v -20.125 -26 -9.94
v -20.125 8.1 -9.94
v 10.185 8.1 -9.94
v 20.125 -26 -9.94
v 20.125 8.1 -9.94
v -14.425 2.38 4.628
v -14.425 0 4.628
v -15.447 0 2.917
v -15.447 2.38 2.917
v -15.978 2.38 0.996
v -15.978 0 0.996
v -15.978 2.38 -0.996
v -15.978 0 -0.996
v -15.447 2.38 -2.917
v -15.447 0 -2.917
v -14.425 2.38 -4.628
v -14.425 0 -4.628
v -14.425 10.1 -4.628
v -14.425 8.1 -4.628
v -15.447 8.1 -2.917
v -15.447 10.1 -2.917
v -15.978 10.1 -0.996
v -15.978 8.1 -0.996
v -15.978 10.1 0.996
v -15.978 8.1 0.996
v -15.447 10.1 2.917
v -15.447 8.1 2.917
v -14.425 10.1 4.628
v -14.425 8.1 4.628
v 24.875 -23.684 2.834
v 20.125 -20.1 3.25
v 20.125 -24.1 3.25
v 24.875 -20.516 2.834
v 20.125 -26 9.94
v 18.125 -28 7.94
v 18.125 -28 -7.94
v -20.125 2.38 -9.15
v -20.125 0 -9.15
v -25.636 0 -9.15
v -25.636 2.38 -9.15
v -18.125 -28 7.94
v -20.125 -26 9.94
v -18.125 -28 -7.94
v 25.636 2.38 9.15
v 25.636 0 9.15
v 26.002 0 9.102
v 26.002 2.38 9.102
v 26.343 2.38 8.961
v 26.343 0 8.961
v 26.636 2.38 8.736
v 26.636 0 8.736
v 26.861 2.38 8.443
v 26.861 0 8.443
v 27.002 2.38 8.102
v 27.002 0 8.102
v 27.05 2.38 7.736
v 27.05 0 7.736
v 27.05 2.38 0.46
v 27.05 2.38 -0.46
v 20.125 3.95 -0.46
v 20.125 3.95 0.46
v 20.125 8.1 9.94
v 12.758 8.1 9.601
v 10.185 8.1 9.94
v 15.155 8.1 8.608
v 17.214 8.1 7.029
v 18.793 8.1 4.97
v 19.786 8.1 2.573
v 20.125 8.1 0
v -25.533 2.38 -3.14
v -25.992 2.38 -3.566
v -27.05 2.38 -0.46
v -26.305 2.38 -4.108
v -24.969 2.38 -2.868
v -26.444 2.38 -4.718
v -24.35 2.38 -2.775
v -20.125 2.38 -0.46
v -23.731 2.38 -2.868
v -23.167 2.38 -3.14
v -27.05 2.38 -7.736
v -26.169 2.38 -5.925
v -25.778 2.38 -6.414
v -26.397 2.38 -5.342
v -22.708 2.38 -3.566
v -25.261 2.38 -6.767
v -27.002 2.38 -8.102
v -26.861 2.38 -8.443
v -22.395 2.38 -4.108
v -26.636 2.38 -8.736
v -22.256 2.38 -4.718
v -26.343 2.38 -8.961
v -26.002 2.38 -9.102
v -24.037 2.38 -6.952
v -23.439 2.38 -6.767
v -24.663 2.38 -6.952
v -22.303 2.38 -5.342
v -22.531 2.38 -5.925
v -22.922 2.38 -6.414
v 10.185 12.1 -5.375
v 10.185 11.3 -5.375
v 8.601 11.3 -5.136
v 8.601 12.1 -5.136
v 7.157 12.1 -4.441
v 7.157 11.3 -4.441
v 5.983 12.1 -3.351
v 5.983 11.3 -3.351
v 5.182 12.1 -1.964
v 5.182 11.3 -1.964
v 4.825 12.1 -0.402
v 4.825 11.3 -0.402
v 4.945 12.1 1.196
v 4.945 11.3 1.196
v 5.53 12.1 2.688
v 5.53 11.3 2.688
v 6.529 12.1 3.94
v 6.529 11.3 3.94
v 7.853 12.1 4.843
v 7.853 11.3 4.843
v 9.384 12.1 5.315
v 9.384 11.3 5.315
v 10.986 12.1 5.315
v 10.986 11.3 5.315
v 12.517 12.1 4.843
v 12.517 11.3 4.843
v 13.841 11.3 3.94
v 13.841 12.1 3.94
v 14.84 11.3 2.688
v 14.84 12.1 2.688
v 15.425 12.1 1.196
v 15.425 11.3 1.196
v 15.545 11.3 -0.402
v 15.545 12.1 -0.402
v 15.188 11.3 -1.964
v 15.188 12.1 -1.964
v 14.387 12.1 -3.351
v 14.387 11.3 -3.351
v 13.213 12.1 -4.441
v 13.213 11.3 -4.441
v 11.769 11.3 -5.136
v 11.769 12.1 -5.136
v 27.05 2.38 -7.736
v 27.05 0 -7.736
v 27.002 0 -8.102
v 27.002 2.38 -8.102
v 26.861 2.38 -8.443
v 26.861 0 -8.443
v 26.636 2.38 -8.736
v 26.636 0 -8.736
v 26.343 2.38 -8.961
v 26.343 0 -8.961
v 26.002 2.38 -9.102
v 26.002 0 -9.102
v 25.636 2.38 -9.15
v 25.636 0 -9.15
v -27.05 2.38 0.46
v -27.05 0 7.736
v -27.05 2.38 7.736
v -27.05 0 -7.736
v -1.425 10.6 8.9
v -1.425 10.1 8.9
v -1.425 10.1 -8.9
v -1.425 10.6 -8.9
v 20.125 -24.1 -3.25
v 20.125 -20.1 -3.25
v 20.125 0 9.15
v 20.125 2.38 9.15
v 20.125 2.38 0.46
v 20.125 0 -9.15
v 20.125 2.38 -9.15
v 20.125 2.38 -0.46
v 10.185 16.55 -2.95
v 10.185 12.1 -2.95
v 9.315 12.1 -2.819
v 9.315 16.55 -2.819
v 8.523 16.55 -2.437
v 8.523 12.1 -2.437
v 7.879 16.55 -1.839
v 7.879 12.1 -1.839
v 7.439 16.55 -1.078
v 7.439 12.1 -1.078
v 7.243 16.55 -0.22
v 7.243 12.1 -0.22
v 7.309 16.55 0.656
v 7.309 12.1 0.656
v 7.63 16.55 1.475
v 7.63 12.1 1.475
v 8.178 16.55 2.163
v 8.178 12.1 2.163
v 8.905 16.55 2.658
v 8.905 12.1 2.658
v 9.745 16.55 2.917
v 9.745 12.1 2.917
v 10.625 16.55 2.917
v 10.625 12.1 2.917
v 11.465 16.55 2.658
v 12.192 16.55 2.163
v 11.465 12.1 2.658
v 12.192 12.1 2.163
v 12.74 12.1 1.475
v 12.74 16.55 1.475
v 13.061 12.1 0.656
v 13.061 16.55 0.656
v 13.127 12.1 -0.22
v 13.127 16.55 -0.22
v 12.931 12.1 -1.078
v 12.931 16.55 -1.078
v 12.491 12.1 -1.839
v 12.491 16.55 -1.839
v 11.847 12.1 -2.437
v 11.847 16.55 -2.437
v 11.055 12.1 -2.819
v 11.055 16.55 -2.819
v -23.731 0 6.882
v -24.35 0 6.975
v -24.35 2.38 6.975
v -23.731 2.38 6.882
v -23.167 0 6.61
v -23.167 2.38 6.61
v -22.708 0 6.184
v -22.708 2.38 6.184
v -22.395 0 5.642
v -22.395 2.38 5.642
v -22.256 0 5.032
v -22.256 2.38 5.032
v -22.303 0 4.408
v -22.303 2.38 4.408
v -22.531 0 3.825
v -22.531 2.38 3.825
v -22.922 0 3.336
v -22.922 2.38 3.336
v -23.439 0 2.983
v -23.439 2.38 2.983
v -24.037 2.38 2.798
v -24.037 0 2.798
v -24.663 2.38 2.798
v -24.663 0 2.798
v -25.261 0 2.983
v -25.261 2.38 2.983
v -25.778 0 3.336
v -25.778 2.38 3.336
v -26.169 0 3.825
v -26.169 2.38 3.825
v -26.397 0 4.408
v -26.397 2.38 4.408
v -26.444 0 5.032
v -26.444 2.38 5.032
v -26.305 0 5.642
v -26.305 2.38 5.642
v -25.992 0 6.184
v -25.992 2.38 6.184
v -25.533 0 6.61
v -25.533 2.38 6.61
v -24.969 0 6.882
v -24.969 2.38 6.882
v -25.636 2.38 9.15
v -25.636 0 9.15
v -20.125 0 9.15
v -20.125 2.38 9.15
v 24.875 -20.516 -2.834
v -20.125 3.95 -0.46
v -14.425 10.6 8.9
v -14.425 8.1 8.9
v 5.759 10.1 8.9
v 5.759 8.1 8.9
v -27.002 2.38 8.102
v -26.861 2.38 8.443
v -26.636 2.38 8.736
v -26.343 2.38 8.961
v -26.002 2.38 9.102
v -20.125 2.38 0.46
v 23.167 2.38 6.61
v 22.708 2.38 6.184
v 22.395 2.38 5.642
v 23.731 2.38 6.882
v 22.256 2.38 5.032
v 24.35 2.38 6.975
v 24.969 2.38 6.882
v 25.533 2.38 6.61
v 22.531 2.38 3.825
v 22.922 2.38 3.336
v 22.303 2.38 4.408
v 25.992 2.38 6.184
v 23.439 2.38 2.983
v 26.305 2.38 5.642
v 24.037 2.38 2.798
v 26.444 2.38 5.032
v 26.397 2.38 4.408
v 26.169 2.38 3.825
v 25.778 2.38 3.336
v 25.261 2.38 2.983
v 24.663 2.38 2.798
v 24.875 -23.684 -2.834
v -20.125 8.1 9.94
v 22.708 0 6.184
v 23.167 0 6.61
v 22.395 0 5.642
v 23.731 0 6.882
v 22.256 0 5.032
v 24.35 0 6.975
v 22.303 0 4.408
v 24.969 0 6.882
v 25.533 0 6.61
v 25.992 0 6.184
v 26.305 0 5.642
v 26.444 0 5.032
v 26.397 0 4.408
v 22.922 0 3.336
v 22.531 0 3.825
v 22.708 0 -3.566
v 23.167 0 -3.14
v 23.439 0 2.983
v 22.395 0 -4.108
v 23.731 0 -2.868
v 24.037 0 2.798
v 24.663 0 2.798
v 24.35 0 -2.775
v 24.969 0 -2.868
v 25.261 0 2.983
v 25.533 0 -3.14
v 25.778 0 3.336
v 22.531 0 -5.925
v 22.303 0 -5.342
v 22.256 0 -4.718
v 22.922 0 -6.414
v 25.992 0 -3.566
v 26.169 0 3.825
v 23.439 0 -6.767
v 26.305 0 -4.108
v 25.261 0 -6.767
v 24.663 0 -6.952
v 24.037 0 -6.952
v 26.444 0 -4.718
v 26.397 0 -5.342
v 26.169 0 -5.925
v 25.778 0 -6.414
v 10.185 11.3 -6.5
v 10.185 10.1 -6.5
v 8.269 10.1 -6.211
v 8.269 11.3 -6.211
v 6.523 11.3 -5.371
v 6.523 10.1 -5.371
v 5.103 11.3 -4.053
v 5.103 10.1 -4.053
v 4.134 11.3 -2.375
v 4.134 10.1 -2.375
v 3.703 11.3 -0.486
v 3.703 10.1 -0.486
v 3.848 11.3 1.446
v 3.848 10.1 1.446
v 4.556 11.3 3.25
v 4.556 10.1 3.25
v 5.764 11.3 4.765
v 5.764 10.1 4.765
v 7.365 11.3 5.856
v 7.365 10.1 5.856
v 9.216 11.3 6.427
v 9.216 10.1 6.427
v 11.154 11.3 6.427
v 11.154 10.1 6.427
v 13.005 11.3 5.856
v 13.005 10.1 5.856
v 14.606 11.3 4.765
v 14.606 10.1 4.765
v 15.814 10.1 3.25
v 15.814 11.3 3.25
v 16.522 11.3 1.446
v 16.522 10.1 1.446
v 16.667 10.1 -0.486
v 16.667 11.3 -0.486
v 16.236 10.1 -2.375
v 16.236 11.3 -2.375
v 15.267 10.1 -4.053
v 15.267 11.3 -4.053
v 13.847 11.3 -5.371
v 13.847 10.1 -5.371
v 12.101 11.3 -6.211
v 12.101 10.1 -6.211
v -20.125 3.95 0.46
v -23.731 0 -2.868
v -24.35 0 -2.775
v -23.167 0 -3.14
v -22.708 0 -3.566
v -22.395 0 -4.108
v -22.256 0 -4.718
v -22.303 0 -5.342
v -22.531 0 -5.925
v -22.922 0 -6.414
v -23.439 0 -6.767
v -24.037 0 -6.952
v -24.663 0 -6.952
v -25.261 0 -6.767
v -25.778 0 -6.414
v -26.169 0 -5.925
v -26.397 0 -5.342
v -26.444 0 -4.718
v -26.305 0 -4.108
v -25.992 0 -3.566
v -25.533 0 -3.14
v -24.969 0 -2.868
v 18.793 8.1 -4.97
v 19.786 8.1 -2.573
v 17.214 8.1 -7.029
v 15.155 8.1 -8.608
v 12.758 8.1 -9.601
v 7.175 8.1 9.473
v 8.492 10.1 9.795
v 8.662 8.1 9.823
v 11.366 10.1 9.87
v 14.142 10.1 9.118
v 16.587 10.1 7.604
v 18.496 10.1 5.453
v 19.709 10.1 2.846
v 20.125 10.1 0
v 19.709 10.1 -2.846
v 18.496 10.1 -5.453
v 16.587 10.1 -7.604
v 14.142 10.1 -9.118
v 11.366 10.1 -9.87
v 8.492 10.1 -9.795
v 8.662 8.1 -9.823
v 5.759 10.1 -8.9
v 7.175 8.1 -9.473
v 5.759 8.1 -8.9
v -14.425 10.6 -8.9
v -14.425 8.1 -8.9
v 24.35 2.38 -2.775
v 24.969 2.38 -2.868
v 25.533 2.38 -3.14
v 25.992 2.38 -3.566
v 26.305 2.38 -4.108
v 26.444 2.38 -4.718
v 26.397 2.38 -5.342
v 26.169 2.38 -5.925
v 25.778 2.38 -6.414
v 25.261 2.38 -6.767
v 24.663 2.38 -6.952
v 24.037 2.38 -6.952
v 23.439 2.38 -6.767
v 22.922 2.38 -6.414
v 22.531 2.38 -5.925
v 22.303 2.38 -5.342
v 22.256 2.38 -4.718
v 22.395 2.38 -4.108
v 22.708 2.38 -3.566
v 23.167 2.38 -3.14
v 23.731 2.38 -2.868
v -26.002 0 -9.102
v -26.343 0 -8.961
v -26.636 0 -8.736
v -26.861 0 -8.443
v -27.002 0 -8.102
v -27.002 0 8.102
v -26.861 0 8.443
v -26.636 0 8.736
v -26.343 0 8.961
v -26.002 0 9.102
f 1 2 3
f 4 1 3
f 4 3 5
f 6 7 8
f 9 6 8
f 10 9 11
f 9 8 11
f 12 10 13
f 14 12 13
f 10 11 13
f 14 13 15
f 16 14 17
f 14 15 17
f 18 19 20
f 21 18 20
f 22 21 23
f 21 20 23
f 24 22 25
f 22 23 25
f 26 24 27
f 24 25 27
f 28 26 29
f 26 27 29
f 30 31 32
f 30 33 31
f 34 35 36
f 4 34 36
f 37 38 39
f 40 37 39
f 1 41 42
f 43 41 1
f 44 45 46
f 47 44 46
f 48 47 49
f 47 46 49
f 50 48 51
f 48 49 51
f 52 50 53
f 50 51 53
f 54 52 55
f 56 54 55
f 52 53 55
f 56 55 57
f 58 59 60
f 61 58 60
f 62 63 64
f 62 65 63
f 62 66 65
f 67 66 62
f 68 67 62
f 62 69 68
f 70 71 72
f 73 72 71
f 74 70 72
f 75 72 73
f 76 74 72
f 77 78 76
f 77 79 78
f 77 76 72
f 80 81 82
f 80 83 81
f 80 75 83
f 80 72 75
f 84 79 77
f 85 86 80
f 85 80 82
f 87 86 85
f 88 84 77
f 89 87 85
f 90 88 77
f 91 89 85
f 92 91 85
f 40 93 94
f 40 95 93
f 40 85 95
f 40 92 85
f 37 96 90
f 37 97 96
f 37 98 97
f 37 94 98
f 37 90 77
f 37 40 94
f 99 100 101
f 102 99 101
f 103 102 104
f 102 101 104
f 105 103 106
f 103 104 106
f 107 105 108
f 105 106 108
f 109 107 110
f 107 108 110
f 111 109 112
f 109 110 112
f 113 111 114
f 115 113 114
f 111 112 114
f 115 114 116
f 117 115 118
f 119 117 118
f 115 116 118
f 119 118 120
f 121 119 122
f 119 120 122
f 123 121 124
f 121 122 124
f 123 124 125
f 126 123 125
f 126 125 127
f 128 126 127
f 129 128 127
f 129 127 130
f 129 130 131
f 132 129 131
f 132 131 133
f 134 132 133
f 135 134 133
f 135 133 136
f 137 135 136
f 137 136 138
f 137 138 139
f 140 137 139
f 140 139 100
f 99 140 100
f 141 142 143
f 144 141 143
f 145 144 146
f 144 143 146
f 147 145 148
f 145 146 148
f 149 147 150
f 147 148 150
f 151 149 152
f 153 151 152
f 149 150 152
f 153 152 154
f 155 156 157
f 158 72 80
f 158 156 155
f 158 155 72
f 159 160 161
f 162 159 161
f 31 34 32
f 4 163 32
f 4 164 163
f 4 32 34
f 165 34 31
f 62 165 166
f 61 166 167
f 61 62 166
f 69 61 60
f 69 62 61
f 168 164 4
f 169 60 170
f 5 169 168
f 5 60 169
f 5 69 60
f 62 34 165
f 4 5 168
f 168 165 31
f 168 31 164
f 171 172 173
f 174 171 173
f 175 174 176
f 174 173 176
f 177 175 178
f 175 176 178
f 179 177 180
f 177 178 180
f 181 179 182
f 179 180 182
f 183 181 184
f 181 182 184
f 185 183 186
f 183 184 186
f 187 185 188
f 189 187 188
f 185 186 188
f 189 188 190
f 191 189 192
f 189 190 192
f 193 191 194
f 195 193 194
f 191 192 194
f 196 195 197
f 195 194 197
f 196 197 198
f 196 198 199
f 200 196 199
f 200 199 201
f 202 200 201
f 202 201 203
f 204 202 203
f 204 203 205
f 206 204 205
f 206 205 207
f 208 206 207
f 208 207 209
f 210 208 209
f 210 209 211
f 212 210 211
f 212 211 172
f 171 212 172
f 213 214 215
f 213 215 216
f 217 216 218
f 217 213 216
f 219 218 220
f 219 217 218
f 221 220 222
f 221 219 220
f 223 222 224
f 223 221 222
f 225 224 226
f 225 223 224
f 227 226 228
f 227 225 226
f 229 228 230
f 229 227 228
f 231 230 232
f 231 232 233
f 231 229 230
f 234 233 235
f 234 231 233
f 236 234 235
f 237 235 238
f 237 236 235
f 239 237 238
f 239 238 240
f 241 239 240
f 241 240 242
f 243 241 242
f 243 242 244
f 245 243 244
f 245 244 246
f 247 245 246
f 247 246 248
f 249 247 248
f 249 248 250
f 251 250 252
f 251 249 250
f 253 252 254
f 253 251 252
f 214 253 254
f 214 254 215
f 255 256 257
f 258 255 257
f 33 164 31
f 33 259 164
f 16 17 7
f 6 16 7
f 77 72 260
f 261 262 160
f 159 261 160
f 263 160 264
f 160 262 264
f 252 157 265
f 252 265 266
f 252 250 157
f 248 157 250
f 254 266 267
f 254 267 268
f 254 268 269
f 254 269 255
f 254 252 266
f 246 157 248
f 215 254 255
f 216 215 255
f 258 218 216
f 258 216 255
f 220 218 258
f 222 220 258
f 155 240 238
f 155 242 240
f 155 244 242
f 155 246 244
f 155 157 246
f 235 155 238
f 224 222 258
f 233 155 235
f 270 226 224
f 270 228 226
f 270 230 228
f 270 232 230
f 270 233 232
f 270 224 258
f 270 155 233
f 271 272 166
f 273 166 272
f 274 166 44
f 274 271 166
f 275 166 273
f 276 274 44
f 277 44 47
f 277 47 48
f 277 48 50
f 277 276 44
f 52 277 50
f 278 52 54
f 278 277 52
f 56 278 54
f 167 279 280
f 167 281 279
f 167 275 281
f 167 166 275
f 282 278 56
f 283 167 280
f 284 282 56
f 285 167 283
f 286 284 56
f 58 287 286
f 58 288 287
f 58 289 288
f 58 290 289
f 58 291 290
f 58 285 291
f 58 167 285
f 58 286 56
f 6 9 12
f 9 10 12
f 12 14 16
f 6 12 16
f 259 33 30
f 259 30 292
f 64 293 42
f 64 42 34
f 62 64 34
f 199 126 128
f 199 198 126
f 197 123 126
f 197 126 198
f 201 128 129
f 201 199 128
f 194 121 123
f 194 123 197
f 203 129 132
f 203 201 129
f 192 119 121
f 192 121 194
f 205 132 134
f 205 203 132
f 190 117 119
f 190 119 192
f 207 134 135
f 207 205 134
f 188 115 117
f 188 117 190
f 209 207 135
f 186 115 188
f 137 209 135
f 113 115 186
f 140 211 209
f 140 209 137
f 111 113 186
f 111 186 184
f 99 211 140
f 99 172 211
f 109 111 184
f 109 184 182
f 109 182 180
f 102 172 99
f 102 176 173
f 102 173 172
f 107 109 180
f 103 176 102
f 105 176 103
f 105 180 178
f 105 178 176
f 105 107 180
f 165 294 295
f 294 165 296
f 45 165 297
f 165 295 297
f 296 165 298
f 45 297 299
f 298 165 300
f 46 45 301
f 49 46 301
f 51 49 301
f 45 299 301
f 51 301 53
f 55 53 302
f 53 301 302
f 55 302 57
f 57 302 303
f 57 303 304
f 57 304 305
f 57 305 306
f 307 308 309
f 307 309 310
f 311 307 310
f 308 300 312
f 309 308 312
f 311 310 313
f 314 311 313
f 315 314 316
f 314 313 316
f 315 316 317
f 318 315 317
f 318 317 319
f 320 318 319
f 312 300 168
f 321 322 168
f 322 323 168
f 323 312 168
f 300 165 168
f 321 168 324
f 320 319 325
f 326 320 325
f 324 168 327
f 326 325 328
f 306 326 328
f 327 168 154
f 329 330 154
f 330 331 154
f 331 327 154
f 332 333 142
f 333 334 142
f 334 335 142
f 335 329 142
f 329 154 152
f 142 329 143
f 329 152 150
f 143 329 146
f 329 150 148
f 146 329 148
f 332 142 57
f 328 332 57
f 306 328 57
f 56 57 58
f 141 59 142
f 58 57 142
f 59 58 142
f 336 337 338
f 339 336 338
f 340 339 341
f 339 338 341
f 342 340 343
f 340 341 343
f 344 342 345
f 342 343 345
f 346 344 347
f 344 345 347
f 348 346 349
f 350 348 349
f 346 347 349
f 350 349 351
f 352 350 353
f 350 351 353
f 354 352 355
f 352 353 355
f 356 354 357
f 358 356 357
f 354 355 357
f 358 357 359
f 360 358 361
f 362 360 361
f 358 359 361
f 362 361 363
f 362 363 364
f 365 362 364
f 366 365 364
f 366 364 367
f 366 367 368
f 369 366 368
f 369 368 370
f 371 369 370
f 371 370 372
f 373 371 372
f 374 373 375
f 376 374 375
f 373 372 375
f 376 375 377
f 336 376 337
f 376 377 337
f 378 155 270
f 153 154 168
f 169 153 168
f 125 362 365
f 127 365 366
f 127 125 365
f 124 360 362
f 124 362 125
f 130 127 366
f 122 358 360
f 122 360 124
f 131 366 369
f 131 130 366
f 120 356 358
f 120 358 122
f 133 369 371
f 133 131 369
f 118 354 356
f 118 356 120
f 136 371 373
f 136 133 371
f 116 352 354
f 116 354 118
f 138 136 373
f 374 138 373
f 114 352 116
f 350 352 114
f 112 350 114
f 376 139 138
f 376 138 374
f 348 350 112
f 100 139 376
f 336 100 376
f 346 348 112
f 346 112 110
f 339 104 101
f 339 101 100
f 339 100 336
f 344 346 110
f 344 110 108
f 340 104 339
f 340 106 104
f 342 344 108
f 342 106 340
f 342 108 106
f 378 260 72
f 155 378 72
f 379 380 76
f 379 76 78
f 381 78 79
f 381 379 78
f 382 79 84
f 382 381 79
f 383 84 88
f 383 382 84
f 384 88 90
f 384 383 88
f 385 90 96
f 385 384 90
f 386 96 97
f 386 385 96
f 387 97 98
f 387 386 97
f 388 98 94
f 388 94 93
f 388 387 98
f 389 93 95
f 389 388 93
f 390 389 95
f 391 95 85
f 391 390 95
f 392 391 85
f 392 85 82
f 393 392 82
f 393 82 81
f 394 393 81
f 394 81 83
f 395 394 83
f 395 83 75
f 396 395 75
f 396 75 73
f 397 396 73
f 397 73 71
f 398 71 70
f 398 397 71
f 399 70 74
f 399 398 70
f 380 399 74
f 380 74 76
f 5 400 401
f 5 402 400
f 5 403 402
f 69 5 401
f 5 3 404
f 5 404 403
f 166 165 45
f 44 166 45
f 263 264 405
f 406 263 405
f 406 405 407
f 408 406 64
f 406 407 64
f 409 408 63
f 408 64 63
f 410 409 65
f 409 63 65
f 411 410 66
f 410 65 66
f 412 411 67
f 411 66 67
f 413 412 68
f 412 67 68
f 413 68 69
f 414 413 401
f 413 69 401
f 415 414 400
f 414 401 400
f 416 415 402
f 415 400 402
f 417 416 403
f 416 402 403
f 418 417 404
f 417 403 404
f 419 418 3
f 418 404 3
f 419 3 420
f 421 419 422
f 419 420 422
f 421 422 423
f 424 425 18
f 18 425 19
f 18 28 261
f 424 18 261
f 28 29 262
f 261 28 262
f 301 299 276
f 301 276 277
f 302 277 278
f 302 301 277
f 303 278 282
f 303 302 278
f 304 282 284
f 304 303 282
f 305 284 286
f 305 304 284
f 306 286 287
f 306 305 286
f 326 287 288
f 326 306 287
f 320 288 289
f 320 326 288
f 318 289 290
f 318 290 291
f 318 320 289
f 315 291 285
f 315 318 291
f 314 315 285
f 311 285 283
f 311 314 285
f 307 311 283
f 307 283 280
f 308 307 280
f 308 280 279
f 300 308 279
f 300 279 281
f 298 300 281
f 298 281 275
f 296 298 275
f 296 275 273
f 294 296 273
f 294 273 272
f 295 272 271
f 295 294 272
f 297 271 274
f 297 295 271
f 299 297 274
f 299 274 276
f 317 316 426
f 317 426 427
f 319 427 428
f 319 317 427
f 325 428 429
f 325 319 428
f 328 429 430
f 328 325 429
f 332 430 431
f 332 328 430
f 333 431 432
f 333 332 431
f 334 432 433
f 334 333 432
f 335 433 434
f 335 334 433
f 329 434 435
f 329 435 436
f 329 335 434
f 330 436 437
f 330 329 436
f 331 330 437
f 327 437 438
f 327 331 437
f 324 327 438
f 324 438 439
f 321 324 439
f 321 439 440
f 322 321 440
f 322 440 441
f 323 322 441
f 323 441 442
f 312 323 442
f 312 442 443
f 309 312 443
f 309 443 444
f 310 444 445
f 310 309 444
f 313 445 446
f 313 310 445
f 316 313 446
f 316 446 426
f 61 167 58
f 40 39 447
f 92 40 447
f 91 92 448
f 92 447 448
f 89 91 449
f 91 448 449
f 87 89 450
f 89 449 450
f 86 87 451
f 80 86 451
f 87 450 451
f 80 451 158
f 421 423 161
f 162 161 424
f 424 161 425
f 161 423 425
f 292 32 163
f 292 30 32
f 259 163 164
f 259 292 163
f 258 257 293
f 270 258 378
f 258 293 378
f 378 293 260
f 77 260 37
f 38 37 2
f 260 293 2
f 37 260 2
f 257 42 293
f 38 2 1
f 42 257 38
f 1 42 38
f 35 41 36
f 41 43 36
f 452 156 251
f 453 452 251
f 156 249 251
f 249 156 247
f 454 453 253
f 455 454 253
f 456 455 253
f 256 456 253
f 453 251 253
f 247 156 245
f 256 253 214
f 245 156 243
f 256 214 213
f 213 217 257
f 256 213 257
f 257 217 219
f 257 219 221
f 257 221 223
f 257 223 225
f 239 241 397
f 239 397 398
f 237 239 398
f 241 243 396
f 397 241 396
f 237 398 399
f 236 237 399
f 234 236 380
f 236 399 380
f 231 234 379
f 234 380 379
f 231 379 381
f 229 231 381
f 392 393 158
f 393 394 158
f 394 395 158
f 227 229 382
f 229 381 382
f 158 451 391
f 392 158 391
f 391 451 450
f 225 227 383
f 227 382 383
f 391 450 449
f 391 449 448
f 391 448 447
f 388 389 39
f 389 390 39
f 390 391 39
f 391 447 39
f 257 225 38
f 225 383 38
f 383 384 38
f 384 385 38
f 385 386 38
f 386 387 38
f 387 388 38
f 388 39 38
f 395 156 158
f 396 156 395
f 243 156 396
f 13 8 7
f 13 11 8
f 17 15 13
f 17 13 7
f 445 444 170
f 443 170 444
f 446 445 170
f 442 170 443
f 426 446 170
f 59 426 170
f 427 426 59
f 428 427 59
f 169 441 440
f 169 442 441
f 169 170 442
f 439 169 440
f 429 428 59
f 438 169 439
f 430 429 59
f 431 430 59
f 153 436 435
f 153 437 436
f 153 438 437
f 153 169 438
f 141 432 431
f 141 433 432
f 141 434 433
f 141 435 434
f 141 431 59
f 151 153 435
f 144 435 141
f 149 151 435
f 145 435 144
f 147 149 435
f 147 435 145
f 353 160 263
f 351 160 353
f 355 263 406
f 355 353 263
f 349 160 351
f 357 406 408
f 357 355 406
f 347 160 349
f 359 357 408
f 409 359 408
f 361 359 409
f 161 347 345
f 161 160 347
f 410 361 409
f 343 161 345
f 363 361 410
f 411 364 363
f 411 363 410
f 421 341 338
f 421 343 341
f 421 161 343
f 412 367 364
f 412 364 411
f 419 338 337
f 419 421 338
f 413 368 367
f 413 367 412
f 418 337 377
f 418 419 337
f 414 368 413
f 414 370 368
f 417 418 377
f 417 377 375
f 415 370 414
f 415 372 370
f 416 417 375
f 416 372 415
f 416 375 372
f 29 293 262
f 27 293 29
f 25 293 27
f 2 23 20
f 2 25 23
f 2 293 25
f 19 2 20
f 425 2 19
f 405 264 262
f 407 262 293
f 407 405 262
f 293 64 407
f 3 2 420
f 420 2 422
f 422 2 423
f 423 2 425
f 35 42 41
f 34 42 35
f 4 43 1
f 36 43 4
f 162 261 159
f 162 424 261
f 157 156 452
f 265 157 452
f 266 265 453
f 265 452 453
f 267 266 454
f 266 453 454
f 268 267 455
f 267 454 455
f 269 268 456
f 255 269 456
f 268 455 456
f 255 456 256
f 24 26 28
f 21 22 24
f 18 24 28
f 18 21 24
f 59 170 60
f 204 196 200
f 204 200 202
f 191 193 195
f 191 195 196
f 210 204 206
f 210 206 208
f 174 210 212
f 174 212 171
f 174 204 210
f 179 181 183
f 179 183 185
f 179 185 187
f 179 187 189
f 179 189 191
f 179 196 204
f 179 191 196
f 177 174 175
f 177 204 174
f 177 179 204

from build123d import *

# Parameters (mm, degrees)
SKETCH1_R           = 2.1
BOSS_EXTRUDE1_DEPTH = 2.38
BOSS_EXTRUDE2_START = 2.38
SKETCH1_3_W         = 40.25
SKETCH1_3_H         = 19.88
SKETCH1_3_W_2       = 6.925
SKETCH1_3_H_2       = 0.92
BOSS_EXTRUDE2_DEPTH = 5.72
BOSS_EXTRUDE3_START = 8.1
BOSS_EXTRUDE3_DEPTH = 2
BOSS_EXTRUDE4_START = 10.1
BOSS_EXTRUDE4_DEPTH = 0.5
BOSS_EXTRUDE5_START = 10.1
SKETCH1_6_R         = 6.5
BOSS_EXTRUDE5_DEPTH = 1.2
BOSS_EXTRUDE6_START = 10.1
SKETCH1_8_R         = 5.375
BOSS_EXTRUDE6_DEPTH = 2
BOSS_EXTRUDE7_START = 10.1
SKETCH1_9_R         = 2.95
BOSS_EXTRUDE7_DEPTH = 6.45
SKETCH1_10_W        = 40.25
SKETCH1_10_H        = 19.88
BOSS_EXTRUDE8_DEPTH = 28
CHAMFER1_SIZE       = 2
SKETCH2_W           = 6.5
SKETCH2_H           = 4
BOSS_EXTRUDE9_DEPTH = 4.75
BOSS_EXTRUDE9_TAPER = 5
CUT_EXTRUDE1_DEPTH  = 44.714035503


with BuildPart() as part:
    # Sketch1 → Boss-Extrude1 (new body)
    with BuildSketch(Plane(origin=(0, 0, 0), x_dir=(1, 0, 0), z_dir=(0, 1, 0))):
        with BuildLine():
            Line((-20.125, -9.15), (-20.125, -9.94))
            Line((-20.125, -9.94), (20.125, -9.94))
            Line((20.125, -9.94), (20.125, -9.15))
            Line((20.125, -9.15), (25.635786438, -9.15))
            ThreePointArc((25.635786438, -9.15), (26.635786438, -8.735786438), (27.05, -7.735786438))
            Line((27.05, -7.735786438), (27.05, 7.735786438))
            ThreePointArc((27.05, 7.735786438), (26.635786438, 8.735786438), (25.635786438, 9.15))
            Line((25.635786438, 9.15), (20.125, 9.15))
            Line((20.125, 9.15), (20.125, 9.94))
            Line((20.125, 9.94), (-20.125, 9.94))
            Line((-20.125, 9.94), (-20.125, 9.15))
            Line((-20.125, 9.15), (-25.635786438, 9.15))
            ThreePointArc((-25.635786438, 9.15), (-26.635786438, 8.735786438), (-27.05, 7.735786438))
            Line((-27.05, 7.735786438), (-27.05, -7.735786438))
            ThreePointArc((-27.05, -7.735786438), (-26.635786438, -8.735786438), (-25.635786438, -9.15))
            Line((-25.635786438, -9.15), (-20.125, -9.15))
        make_face()
        with BuildLine():
            ThreePointArc((-14.425, -4.627785648), (-16.045, 0), (-14.425, 4.627785648))
            Line((-14.425, 4.627785648), (-14.425, -4.627785648))
        make_face(mode=Mode.SUBTRACT)
        with Locations(Location((-24.35, -4.875, 0), (0, 0, 270))):
            Circle(SKETCH1_R, mode=Mode.SUBTRACT)
        with Locations(Location((24.35, -4.875, 0), (0, 0, 270))):
            Circle(SKETCH1_R, mode=Mode.SUBTRACT)
        with Locations(Location((-24.35, 4.875, 0), (0, 0, 270))):
            Circle(SKETCH1_R, mode=Mode.SUBTRACT)
        with Locations(Location((24.35, 4.875, 0), (0, 0, 270))):
            Circle(SKETCH1_R, mode=Mode.SUBTRACT)
    extrude(amount=BOSS_EXTRUDE1_DEPTH)

    # Sketch1<3> → Boss-Extrude2 (add)
    with BuildSketch(Plane(origin=(0, 0, 0), x_dir=(1, 0, 0), z_dir=(0, 1, 0)).offset(BOSS_EXTRUDE2_START)):
        Rectangle(SKETCH1_3_W, SKETCH1_3_H)
        with Locations((-23.5875, 0)):
            Rectangle(SKETCH1_3_W_2, SKETCH1_3_H_2)
        with Locations((23.5875, 0)):
            Rectangle(SKETCH1_3_W_2, SKETCH1_3_H_2)
    extrude(amount=BOSS_EXTRUDE2_DEPTH)

    # Sketch1<4> → Boss-Extrude3 (add)
    with BuildSketch(Plane(origin=(0, 0, 0), x_dir=(1, 0, 0), z_dir=(0, 1, 0)).offset(BOSS_EXTRUDE3_START)):
        with BuildLine():
            Line((5.758534141, 8.9), (-14.425, 8.9))
            Line((-14.425, 8.9), (-14.425, 4.627785648))
            ThreePointArc((-14.425, 4.627785648), (-16.045, 0), (-14.425, -4.627785648))
            Line((-14.425, -4.627785648), (-14.425, -8.9))
            Line((-14.425, -8.9), (5.758534141, -8.9))
            ThreePointArc((5.758534141, -8.9), (20.125, 0), (5.758534141, 8.9))
        make_face()
    extrude(amount=BOSS_EXTRUDE3_DEPTH)

    # Sketch1<5> → Boss-Extrude4 (add)
    with BuildSketch(Plane(origin=(0, 0, 0), x_dir=(1, 0, 0), z_dir=(0, 1, 0)).offset(BOSS_EXTRUDE4_START)):
        Polygon((-14.425, -8.9), (-1.425, -8.9), (-1.425, 8.9), (-14.425, 8.9), (-14.425, 4.627785648), (-14.425, -4.627785648), align=None)
    extrude(amount=BOSS_EXTRUDE4_DEPTH)

    # Sketch1<6> → Boss-Extrude5 (add)
    with BuildSketch(Plane(origin=(0, 0, 0), x_dir=(1, 0, 0), z_dir=(0, 1, 0)).offset(BOSS_EXTRUDE5_START)):
        with Locations(Location((10.185, 0, 0), (0, 0, 90))):
            Circle(SKETCH1_6_R)
    extrude(amount=BOSS_EXTRUDE5_DEPTH)

    # Sketch1<8> → Boss-Extrude6 (add)
    with BuildSketch(Plane(origin=(0, 0, 0), x_dir=(1, 0, 0), z_dir=(0, 1, 0)).offset(BOSS_EXTRUDE6_START)):
        with Locations(Location((10.185, 0, 0), (0, 0, 90))):
            Circle(SKETCH1_8_R)
    extrude(amount=BOSS_EXTRUDE6_DEPTH)

    # Sketch1<9> → Boss-Extrude7 (add)
    with BuildSketch(Plane(origin=(0, 0, 0), x_dir=(1, 0, 0), z_dir=(0, 1, 0)).offset(BOSS_EXTRUDE7_START)):
        with Locations(Location((10.185, 0, 0), (0, 0, 90))):
            Circle(SKETCH1_9_R)
    extrude(amount=BOSS_EXTRUDE7_DEPTH)

    # Sketch1<10> → Boss-Extrude8 (add)
    with BuildSketch(Plane(origin=(0, 0, 0), x_dir=(1, 0, 0), z_dir=(0, 1, 0))):
        Rectangle(SKETCH1_10_W, SKETCH1_10_H)
    extrude(amount=-BOSS_EXTRUDE8_DEPTH)

    # Chamfer1
    chamfer1_edges = [part.edges().sort_by_distance(p)[0] for p in [
        (0, -28, 9.94),
        (20.125, -28, 0),
        (-20.125, -28, 0),
        (0, -28, -9.94),
    ]]
    chamfer(chamfer1_edges, length=CHAMFER1_SIZE)

    # Sketch2 → Boss-Extrude9 (add)
    with BuildSketch(Plane(origin=(20.125, 0, 0), x_dir=(0, 0, -1), z_dir=(1, 0, 0))):
        with Locations((0, -22.1)):
            Rectangle(SKETCH2_W, SKETCH2_H)
    extrude(amount=BOSS_EXTRUDE9_DEPTH, taper=BOSS_EXTRUDE9_TAPER)

    # Sketch3 → Cut-Extrude1 (cut, through all)
    with BuildSketch(Plane(origin=(0, 0, -9.94), x_dir=(-1, 0, 0), z_dir=(0, 0, -1))):
        Polygon((-27.05, 8.1), (-27.05, 2.38), (-20.125, 3.95), (-20.125, 8.1), align=None)
        Polygon((20.125, 3.95), (27.05, 2.38), (27.05, 8.1), (20.125, 8.1), align=None)
    extrude(amount=-CUT_EXTRUDE1_DEPTH, mode=Mode.SUBTRACT)


solid = part.part
